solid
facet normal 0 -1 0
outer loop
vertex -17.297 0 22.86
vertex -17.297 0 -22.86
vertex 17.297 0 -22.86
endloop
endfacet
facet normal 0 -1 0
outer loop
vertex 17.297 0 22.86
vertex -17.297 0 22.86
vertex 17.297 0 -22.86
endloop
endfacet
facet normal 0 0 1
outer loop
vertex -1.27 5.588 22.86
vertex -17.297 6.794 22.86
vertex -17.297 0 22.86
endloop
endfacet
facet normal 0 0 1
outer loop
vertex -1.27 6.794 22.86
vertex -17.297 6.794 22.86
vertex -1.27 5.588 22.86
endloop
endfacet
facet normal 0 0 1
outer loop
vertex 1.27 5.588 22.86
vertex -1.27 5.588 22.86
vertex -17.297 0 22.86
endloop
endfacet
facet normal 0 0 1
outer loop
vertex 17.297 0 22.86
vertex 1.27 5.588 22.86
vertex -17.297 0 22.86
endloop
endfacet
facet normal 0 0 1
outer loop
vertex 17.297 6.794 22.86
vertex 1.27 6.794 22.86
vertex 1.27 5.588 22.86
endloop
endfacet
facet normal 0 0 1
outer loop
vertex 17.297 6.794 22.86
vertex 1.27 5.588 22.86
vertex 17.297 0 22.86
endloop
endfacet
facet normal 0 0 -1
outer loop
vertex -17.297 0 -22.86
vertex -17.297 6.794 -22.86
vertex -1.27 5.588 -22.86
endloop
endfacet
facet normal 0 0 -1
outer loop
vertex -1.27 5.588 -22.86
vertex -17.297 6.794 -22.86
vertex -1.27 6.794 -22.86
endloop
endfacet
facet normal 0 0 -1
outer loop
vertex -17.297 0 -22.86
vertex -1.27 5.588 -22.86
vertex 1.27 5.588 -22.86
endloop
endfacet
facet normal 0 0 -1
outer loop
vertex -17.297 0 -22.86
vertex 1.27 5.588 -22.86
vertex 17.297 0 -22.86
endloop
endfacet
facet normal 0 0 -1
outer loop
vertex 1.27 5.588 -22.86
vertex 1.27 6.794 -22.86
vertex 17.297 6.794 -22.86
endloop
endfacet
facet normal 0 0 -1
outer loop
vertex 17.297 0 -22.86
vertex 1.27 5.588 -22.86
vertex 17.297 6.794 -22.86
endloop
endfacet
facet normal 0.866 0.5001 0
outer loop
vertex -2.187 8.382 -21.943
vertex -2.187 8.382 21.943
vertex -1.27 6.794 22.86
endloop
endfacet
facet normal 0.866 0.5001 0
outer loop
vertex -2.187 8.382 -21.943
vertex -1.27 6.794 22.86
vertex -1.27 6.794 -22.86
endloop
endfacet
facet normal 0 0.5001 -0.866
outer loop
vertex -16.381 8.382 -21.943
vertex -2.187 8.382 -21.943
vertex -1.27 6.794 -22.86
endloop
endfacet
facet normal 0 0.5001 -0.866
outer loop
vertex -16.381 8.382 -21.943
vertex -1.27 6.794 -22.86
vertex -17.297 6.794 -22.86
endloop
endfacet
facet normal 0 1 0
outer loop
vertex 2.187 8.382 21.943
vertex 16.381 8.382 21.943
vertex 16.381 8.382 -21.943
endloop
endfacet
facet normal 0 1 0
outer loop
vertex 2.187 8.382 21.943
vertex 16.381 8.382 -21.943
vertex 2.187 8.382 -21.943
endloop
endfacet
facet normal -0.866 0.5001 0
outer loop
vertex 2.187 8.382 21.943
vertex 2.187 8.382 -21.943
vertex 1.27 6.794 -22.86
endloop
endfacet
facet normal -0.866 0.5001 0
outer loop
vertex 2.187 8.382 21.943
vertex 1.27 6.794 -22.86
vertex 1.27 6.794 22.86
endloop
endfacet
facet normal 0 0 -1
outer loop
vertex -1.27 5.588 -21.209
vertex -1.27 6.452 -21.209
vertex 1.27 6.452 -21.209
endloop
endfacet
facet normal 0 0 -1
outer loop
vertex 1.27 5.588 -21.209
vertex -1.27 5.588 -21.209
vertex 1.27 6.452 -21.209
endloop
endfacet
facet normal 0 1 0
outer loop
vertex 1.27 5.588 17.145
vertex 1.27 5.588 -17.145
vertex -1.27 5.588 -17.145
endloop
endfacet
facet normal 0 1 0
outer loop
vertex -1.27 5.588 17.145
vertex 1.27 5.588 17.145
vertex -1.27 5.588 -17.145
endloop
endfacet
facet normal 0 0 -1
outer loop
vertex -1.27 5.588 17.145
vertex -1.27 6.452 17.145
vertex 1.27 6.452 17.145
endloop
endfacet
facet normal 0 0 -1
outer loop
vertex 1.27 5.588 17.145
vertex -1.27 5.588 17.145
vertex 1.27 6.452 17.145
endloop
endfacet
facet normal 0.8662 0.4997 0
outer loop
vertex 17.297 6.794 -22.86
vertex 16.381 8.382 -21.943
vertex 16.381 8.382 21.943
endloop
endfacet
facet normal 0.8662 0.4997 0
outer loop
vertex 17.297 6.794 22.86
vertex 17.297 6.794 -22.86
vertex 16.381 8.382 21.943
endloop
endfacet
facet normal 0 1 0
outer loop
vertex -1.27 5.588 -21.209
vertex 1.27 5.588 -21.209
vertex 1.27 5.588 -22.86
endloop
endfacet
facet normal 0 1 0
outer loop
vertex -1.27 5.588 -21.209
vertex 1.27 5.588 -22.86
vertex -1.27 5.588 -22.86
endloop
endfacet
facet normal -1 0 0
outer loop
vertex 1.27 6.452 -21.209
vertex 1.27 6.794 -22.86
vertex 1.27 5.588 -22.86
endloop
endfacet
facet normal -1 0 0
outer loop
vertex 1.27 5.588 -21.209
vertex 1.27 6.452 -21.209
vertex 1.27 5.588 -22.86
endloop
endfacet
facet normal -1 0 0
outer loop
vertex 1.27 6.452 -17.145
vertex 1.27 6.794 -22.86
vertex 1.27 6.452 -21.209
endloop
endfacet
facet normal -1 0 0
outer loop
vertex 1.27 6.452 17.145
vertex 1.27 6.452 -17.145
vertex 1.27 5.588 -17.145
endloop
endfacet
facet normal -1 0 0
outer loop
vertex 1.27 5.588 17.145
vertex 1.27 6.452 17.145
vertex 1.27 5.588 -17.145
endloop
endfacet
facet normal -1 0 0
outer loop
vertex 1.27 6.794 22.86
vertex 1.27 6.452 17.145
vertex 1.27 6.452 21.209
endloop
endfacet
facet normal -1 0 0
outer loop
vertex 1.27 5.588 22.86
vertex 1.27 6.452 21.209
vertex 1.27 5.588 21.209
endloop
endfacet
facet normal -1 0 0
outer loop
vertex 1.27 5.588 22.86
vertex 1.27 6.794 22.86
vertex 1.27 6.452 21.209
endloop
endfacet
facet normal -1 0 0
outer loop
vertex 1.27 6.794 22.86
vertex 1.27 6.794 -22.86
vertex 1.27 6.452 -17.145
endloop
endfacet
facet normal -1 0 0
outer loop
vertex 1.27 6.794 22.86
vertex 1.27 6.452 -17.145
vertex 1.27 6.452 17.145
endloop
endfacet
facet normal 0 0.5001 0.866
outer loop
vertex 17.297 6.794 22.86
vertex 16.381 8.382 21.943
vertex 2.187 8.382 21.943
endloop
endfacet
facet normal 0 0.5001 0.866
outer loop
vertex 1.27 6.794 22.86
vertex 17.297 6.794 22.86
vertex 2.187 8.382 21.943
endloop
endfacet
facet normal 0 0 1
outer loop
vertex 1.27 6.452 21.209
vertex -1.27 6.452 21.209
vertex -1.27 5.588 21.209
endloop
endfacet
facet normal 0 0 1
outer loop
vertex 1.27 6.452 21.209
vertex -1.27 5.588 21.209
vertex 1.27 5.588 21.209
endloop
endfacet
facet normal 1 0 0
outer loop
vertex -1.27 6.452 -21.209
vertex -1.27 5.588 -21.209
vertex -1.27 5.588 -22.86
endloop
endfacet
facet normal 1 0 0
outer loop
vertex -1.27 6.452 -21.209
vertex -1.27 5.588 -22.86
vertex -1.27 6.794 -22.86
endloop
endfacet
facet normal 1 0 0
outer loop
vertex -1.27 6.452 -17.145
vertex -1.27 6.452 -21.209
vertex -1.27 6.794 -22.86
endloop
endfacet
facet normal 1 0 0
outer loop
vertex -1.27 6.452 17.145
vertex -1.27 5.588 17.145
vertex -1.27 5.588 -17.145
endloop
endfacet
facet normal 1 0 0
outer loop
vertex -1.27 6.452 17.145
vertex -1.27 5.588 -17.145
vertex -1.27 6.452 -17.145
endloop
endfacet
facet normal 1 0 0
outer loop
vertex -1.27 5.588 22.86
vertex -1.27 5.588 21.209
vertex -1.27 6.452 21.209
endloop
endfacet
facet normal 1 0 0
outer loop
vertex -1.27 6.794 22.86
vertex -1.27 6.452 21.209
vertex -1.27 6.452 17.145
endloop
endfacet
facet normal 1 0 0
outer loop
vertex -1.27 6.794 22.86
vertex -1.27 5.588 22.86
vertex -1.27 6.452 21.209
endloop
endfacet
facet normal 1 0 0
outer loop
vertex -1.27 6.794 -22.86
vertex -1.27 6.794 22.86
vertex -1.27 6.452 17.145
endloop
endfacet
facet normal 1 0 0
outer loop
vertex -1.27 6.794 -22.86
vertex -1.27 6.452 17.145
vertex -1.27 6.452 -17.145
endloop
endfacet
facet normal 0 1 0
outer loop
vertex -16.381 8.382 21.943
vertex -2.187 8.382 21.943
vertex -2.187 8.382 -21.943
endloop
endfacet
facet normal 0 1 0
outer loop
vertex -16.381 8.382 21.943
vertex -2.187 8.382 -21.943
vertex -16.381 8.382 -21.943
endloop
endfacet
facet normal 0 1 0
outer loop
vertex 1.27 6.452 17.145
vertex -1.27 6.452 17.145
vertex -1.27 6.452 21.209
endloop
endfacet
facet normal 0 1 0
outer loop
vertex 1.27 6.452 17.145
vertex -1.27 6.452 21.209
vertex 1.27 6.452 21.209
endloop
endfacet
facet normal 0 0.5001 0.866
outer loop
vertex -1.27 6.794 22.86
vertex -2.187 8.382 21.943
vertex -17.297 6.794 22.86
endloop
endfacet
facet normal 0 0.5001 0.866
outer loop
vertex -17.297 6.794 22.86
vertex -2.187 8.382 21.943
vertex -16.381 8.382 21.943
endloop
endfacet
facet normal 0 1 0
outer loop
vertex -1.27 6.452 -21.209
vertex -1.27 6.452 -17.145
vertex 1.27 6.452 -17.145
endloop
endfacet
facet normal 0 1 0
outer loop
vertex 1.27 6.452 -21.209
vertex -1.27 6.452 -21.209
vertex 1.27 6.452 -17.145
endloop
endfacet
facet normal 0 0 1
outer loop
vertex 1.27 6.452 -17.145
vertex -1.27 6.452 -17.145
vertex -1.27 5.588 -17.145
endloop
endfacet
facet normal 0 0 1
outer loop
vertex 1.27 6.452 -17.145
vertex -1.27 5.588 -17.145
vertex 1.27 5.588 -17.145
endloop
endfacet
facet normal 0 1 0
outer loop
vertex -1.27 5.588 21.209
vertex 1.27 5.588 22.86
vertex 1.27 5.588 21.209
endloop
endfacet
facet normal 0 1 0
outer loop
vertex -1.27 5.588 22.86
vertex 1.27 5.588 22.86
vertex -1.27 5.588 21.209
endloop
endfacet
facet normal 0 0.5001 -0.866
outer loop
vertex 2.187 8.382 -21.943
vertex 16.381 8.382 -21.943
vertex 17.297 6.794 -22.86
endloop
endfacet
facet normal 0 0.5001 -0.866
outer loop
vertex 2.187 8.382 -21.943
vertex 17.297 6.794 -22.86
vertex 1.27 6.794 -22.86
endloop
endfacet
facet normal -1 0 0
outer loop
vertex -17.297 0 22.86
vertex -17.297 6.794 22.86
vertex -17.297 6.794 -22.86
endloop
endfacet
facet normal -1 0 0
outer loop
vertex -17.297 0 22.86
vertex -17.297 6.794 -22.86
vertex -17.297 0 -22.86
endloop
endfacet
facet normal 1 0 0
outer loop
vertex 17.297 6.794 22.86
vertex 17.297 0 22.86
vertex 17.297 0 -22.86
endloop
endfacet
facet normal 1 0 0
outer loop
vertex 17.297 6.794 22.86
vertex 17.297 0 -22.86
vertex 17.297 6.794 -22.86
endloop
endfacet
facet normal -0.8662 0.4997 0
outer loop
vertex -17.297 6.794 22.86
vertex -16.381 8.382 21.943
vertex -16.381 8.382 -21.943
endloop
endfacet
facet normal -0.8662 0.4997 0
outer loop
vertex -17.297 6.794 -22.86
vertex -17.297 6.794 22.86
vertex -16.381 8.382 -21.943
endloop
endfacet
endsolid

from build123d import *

# Parameters (mm, degrees)
BOSS_EXTRUDE1_DEPTH   = 22.86
CHAMFER1_SIZE         = 1.5875
CHAMFER1_SIZE2        = 0.916543552
CHAMFER1_PART_2_SIZE  = 1.5875
CHAMFER1_PART_2_SIZE2 = 0.916543552
CHAMFER1_PART_3_SIZE  = 1.5875
CHAMFER1_PART_3_SIZE2 = 0.916543552
CHAMFER1_PART_4_SIZE  = 1.5875
CHAMFER1_PART_4_SIZE2 = 0.916543552
CHAMFER1_PART_5_SIZE  = 1.5875
CHAMFER1_PART_5_SIZE2 = 0.916543552
CHAMFER1_PART_6_SIZE  = 1.5875
CHAMFER1_PART_6_SIZE2 = 0.916543552
BOSS_EXTRUDE2_START   = 17.145
SKETCH2_W             = 2.54
SKETCH2_H             = 0.8636
BOSS_EXTRUDE2_DEPTH   = 4.064


with BuildPart() as part:
    # Sketch1 → Boss-Extrude1 (new body, symmetric)
    with BuildSketch(Plane.XY):
        Polygon((-17.2974, 0), (17.2974, 0), (17.2974, 8.382), (1.27, 8.382), (1.27, 5.588), (-1.27, 5.588), (-1.27, 8.382), (-17.2974, 8.382), align=None)
    extrude(amount=BOSS_EXTRUDE1_DEPTH, both=True)

    # Chamfer1
    chamfer1_edges = [part.edges().sort_by_distance(p)[0] for p in [
        (9.2837, 8.382, -22.86),
        (-9.2837, 8.382, -22.86),
    ]]
    chamfer1_side = [part.faces().sort_by_distance(p)[0] for p in [
        (0, 4.120904666, -22.86),
    ]]
    chamfer(chamfer1_edges, length=CHAMFER1_SIZE, length2=CHAMFER1_SIZE2, reference=chamfer1_side[0])

    # Chamfer1 part 2
    chamfer1_part_2_edges = [part.edges().sort_by_distance(p)[0] for p in [
        (17.2974, 8.382, 0),
    ]]
    chamfer1_part_2_side = [part.faces().sort_by_distance(p)[0] for p in [
        (17.2974, 4.191, 0),
    ]]
    chamfer(chamfer1_part_2_edges, length=CHAMFER1_PART_2_SIZE, length2=CHAMFER1_PART_2_SIZE2, reference=chamfer1_part_2_side[0])

    # Chamfer1 part 3
    chamfer1_part_3_edges = [part.edges().sort_by_distance(p)[0] for p in [
        (-17.2974, 8.382, 0),
    ]]
    chamfer1_part_3_side = [part.faces().sort_by_distance(p)[0] for p in [
        (-17.2974, 4.191, 0),
    ]]
    chamfer(chamfer1_part_3_edges, length=CHAMFER1_PART_3_SIZE, length2=CHAMFER1_PART_3_SIZE2, reference=chamfer1_part_3_side[0])

    # Chamfer1 part 4
    chamfer1_part_4_edges = [part.edges().sort_by_distance(p)[0] for p in [
        (-1.27, 8.382, 0),
    ]]
    chamfer1_part_4_side = [part.faces().sort_by_distance(p)[0] for p in [
        (-1.27, 6.985, 0),
    ]]
    chamfer(chamfer1_part_4_edges, length=CHAMFER1_PART_4_SIZE, length2=CHAMFER1_PART_4_SIZE2, reference=chamfer1_part_4_side[0])

    # Chamfer1 part 5
    chamfer1_part_5_edges = [part.edges().sort_by_distance(p)[0] for p in [
        (1.27, 8.382, 0),
    ]]
    chamfer1_part_5_side = [part.faces().sort_by_distance(p)[0] for p in [
        (1.27, 6.985, 0),
    ]]
    chamfer(chamfer1_part_5_edges, length=CHAMFER1_PART_5_SIZE, length2=CHAMFER1_PART_5_SIZE2, reference=chamfer1_part_5_side[0])

    # Chamfer1 part 6
    chamfer1_part_6_edges = [part.edges().sort_by_distance(p)[0] for p in [
        (-9.2837, 8.382, 22.86),
        (9.2837, 8.382, 22.86),
    ]]
    chamfer1_part_6_side = [part.faces().sort_by_distance(p)[0] for p in [
        (0, 4.120904666, 22.86),
    ]]
    chamfer(chamfer1_part_6_edges, length=CHAMFER1_PART_6_SIZE, length2=CHAMFER1_PART_6_SIZE2, reference=chamfer1_part_6_side[0])

    # Sketch2 → Boss-Extrude2 (add)
    with BuildSketch(Plane.XY.offset(BOSS_EXTRUDE2_START)):
        with Locations((0, 6.0198)):
            Rectangle(SKETCH2_W, SKETCH2_H)
    boss_extrude2 = extrude(amount=BOSS_EXTRUDE2_DEPTH)

    # Mirror1: Boss-Extrude2 across plane
    add(boss_extrude2.mirror(Plane.XY))


solid = part.part
